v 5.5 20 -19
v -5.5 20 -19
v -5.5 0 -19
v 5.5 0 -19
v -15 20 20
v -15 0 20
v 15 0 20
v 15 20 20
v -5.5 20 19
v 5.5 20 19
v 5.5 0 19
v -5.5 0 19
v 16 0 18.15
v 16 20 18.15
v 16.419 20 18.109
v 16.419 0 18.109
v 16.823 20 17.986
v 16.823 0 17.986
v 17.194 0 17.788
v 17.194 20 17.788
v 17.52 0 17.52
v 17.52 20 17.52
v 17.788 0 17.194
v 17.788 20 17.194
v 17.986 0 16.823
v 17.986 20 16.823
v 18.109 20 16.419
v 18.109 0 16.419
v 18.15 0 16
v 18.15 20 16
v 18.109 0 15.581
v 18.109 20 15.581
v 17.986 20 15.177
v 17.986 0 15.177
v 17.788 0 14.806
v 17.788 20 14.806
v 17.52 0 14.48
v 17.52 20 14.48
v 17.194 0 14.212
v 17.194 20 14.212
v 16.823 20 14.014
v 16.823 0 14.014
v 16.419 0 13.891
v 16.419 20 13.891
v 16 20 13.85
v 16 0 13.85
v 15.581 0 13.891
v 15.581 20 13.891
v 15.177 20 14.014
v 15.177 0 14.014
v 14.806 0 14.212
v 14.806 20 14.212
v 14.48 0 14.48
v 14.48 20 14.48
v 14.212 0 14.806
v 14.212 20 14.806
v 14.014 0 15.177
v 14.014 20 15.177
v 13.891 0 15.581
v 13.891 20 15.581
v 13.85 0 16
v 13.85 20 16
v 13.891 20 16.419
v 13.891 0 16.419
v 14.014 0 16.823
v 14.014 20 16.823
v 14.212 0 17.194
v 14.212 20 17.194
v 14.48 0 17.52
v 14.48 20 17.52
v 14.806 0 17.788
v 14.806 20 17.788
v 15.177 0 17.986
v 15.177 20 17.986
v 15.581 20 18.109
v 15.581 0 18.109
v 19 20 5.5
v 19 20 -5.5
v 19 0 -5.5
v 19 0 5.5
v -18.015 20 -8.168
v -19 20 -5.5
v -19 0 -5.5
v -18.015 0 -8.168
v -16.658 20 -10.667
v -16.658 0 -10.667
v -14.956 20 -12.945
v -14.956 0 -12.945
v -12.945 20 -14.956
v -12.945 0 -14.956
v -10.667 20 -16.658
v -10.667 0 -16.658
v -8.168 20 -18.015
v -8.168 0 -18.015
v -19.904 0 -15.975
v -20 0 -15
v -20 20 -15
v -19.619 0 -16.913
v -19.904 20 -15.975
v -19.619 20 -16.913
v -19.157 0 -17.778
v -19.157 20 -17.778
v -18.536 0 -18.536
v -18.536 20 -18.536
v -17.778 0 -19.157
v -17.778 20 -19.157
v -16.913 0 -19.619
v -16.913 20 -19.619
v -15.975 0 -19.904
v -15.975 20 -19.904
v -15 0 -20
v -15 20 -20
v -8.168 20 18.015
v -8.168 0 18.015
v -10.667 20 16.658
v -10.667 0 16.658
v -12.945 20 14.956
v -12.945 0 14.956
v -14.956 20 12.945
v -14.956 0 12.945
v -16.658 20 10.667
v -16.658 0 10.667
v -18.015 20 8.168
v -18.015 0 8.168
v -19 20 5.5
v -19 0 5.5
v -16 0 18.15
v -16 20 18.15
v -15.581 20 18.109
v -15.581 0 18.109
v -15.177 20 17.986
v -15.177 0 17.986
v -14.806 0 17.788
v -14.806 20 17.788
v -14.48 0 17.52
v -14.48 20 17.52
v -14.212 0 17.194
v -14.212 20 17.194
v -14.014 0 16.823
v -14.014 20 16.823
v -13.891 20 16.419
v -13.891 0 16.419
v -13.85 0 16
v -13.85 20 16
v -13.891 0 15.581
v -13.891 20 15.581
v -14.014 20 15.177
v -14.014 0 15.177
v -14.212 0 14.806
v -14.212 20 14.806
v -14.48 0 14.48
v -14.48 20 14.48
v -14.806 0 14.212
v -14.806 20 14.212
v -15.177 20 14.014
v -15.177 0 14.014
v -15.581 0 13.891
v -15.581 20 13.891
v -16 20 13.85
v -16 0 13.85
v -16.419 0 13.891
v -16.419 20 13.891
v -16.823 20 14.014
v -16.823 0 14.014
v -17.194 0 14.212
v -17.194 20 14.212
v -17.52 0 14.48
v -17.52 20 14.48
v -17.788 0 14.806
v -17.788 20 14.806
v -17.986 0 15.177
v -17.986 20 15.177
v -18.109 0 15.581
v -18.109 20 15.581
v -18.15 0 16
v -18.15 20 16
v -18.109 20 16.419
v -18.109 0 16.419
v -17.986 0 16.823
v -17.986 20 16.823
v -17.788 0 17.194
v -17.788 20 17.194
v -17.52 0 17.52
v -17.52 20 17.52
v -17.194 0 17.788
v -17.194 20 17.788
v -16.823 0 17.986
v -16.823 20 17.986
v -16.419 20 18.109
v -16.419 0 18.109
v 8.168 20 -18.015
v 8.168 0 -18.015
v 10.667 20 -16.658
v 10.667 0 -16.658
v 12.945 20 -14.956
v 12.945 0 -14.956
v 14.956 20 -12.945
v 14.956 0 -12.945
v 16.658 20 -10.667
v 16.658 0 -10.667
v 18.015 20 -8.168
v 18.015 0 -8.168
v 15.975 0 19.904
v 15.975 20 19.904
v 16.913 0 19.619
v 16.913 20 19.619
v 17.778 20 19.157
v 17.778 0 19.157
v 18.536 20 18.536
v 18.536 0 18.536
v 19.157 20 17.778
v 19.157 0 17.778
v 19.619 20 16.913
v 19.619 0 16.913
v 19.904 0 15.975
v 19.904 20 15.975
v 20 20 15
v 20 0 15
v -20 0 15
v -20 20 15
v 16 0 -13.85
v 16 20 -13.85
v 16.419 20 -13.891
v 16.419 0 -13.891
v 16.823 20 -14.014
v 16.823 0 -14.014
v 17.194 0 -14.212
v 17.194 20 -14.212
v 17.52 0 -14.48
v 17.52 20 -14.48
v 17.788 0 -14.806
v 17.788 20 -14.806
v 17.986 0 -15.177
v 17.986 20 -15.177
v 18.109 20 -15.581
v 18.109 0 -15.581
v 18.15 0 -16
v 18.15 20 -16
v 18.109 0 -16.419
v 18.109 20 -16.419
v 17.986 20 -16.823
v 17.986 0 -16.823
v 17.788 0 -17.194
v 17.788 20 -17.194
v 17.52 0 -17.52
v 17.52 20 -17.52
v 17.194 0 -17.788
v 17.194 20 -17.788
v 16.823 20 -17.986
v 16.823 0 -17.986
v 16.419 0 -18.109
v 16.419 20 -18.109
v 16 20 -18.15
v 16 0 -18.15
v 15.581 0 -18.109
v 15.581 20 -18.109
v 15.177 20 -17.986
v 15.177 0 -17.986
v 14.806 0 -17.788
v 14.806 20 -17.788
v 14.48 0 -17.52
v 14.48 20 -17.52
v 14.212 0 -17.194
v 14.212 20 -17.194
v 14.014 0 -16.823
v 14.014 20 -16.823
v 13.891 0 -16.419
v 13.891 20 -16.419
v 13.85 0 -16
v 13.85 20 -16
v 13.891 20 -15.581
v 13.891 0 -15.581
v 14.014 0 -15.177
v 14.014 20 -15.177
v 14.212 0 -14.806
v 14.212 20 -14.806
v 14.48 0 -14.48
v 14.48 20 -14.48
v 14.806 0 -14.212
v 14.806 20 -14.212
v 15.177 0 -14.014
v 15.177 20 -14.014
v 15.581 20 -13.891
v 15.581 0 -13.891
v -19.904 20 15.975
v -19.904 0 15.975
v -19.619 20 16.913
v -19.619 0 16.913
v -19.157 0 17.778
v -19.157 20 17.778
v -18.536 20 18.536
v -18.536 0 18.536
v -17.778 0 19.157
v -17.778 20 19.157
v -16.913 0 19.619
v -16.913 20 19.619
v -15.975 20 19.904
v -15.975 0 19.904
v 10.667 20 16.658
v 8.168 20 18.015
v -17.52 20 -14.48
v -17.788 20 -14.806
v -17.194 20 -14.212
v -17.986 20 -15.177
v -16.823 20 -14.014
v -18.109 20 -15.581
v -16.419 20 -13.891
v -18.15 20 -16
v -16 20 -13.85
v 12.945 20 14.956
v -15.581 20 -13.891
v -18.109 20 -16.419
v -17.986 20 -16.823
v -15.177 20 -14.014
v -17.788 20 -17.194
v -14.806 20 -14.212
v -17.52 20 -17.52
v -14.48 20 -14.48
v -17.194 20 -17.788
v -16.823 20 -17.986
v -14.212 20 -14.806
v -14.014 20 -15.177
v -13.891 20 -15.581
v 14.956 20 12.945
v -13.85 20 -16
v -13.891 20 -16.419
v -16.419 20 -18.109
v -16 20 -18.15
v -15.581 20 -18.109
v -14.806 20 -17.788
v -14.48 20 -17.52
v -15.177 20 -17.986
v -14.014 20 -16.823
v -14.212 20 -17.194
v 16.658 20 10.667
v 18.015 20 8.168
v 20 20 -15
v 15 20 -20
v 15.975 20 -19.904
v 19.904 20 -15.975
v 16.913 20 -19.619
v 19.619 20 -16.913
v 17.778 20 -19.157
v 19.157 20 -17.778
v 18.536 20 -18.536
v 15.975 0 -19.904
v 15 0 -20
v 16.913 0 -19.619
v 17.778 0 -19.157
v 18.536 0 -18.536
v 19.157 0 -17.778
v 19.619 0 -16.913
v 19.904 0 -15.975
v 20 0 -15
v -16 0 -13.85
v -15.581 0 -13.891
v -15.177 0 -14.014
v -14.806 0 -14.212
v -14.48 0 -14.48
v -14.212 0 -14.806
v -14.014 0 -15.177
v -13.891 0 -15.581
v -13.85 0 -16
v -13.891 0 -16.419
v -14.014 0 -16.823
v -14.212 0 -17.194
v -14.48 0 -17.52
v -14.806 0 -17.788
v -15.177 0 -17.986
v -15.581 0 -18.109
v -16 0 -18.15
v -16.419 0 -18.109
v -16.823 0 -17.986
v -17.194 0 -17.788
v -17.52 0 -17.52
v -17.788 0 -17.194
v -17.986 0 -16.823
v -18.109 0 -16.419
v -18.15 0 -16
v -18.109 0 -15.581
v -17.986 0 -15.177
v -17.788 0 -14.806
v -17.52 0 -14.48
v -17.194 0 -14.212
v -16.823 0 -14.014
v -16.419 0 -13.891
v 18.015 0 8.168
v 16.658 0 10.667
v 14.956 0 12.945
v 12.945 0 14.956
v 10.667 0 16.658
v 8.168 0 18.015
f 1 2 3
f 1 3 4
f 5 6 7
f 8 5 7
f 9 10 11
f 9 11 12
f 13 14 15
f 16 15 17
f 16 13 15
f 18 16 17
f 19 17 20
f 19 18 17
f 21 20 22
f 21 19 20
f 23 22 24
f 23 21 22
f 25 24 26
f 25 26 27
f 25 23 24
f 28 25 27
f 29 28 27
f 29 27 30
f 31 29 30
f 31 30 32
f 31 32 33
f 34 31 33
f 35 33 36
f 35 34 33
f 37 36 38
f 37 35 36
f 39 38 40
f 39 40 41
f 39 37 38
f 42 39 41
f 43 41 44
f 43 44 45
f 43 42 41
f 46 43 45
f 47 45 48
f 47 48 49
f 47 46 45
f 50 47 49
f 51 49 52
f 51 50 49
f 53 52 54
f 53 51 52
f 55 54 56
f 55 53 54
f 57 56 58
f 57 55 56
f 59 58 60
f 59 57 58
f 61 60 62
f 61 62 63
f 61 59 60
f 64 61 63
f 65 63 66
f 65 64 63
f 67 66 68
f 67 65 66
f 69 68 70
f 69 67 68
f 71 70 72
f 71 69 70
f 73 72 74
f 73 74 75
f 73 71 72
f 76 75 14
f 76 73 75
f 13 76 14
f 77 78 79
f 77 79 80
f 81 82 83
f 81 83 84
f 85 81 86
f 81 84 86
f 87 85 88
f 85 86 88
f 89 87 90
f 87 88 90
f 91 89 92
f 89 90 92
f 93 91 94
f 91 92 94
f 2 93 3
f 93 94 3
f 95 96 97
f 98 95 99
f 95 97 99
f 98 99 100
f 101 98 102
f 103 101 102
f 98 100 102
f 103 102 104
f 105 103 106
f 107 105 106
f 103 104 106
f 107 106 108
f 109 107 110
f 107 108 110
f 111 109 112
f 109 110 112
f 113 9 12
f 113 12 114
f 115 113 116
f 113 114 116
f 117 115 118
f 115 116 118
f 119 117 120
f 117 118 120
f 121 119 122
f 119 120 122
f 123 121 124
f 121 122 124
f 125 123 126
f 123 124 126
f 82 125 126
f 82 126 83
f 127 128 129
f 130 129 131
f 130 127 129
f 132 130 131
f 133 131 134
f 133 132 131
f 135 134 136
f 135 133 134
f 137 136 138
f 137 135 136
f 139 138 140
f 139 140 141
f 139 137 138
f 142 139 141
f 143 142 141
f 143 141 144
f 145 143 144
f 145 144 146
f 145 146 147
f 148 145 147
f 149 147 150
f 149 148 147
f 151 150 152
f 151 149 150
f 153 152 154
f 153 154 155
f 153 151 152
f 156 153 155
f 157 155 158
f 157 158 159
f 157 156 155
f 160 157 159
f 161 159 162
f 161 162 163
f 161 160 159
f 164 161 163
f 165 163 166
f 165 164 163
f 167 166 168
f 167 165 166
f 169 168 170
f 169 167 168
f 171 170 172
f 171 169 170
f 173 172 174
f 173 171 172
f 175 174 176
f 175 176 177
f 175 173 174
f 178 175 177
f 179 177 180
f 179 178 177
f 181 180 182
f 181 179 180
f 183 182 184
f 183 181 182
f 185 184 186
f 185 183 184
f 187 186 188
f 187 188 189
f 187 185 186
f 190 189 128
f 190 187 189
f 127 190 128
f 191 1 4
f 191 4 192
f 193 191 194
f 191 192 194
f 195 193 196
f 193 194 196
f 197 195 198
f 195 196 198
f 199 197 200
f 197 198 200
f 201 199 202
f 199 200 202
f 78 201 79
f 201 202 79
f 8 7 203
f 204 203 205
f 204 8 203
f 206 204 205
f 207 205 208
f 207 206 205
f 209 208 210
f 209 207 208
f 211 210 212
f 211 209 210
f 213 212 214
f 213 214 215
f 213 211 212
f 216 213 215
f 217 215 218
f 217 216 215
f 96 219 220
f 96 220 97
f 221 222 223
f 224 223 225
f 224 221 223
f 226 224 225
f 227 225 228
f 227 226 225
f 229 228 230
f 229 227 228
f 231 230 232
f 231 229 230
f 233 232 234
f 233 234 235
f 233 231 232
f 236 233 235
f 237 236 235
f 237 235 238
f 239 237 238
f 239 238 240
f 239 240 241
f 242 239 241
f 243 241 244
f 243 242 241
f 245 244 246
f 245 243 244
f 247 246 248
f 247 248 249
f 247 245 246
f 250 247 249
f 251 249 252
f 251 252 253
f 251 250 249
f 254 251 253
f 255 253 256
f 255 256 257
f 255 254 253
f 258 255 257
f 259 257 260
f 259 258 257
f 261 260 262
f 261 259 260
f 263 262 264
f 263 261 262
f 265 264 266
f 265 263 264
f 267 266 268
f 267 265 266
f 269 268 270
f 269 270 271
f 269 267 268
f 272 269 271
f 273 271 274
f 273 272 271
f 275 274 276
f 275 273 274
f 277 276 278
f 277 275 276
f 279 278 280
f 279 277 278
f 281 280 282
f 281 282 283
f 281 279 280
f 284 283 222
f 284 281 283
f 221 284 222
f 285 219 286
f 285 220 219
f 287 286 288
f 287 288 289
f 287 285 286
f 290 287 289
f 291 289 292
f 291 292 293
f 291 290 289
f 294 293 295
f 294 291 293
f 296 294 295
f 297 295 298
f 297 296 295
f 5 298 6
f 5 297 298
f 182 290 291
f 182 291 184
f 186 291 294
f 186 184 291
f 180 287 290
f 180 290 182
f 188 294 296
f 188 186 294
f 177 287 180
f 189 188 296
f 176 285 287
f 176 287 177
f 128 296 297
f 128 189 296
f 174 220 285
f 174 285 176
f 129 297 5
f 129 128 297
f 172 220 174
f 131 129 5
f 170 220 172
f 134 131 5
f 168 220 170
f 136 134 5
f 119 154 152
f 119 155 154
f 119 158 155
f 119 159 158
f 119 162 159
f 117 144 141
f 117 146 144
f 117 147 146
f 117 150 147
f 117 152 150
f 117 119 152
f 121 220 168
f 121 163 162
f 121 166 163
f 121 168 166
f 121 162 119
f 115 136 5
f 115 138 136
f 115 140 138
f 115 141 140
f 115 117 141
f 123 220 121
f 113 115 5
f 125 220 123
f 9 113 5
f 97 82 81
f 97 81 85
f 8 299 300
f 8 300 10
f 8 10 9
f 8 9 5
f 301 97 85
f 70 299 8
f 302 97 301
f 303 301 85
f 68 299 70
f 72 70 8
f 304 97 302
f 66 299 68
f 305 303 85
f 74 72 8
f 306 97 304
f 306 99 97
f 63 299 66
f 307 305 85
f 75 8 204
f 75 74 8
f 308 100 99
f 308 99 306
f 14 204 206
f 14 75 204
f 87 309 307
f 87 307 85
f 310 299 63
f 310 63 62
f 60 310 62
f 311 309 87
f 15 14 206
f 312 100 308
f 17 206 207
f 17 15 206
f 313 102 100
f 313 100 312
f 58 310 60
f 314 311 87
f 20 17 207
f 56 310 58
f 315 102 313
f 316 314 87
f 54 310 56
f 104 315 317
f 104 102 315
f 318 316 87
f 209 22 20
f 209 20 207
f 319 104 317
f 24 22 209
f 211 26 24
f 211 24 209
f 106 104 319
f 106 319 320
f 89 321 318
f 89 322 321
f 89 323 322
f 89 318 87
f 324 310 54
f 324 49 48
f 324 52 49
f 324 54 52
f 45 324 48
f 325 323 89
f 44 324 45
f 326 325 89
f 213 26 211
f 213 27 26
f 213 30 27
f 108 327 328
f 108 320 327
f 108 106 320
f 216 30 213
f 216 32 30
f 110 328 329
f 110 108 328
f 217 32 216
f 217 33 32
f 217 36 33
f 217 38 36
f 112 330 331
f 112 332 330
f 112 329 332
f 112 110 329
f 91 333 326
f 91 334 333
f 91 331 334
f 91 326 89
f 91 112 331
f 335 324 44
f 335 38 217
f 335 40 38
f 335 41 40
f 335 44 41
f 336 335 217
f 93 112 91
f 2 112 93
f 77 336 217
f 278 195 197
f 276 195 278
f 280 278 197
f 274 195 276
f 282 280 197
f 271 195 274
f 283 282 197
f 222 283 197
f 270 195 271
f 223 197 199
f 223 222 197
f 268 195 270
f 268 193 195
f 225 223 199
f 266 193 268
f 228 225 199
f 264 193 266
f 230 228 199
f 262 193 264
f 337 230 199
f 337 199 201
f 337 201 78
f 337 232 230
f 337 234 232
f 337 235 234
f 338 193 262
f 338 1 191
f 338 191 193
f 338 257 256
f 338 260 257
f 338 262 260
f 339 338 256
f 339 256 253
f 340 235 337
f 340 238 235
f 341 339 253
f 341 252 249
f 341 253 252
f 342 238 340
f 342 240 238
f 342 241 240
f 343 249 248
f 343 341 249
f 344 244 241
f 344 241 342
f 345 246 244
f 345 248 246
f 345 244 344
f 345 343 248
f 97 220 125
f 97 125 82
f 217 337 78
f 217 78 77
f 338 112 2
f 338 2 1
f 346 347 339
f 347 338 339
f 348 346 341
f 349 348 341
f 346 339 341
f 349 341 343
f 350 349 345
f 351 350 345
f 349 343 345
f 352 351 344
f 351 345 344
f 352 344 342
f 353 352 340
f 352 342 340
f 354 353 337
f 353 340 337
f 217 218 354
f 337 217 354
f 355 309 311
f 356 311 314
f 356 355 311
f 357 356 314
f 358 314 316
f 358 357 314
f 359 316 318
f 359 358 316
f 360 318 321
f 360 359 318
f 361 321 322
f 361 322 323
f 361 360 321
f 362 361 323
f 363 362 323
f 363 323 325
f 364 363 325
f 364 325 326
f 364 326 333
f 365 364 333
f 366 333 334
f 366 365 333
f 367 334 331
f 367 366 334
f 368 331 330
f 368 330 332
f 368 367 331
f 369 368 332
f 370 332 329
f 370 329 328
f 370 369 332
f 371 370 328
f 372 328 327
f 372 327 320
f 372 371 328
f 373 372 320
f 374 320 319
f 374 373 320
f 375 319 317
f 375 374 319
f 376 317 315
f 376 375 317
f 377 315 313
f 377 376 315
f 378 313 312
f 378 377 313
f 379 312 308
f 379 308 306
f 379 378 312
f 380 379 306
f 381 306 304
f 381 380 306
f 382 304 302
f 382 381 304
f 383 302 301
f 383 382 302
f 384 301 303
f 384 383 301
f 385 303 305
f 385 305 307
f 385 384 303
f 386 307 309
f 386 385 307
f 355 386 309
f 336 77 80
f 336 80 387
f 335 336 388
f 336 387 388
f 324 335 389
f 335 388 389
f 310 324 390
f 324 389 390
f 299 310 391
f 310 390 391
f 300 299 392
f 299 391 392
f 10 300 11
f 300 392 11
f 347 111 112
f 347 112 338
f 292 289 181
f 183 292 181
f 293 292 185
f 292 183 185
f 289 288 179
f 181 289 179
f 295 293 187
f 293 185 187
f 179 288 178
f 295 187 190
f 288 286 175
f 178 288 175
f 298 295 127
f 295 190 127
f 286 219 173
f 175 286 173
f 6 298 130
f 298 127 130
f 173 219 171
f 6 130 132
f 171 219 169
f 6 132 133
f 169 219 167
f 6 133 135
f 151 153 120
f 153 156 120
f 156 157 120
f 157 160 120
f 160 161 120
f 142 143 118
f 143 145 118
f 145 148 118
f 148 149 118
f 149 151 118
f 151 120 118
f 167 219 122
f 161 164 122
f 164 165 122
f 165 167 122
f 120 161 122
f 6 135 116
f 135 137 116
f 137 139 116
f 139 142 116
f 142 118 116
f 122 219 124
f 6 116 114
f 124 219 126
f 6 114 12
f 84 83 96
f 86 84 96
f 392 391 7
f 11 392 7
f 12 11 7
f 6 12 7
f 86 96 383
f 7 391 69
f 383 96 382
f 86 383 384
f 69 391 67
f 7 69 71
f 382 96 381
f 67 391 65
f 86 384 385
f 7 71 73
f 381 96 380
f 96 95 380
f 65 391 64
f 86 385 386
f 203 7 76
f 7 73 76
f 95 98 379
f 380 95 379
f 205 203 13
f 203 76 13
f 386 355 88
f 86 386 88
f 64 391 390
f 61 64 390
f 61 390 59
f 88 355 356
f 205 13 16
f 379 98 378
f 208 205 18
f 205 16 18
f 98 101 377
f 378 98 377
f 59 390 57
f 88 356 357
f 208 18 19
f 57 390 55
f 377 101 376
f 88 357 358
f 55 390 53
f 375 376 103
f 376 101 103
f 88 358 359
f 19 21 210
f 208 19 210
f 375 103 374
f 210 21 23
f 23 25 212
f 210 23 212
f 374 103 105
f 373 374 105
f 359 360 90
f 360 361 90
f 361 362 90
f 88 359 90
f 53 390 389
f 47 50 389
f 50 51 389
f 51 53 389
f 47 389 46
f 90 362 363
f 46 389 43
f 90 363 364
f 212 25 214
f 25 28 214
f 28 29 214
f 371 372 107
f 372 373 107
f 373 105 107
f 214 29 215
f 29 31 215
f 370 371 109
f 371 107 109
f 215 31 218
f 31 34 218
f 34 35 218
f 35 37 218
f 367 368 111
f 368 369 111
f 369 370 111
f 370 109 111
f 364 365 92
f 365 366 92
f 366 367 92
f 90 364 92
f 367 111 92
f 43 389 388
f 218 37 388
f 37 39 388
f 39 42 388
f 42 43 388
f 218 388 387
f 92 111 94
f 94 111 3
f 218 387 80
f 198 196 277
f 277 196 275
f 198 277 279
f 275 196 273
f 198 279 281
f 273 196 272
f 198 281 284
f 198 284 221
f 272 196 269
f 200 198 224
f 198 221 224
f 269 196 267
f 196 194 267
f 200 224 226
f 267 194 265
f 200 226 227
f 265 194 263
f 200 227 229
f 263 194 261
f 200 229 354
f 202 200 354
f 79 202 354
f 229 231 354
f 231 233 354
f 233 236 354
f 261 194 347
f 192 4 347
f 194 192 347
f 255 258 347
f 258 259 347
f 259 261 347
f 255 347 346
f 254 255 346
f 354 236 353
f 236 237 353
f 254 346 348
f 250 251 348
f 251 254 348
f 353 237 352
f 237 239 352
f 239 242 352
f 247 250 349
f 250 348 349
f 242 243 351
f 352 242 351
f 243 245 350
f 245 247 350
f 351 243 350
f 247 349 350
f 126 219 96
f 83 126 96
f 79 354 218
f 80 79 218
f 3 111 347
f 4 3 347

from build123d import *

# Parameters (mm, degrees)
SKETCH1_W           = 40
SKETCH1_H           = 40
SKETCH1_R           = 2.15
BOSS_EXTRUDE1_DEPTH = 20
FILLET1_R           = 5


with BuildPart() as part:
    # Sketch1 → Boss-Extrude1 (new body)
    with BuildSketch(Plane(origin=(0, 0, 0), x_dir=(1, 0, 0), z_dir=(0, 1, 0))):
        Rectangle(SKETCH1_W, SKETCH1_H)
        with Locations((16, 16)):
            Circle(SKETCH1_R, mode=Mode.SUBTRACT)
        with Locations((16, -16)):
            Circle(SKETCH1_R, mode=Mode.SUBTRACT)
        with Locations((-16, -16)):
            Circle(SKETCH1_R, mode=Mode.SUBTRACT)
        with Locations((-16, 16)):
            Circle(SKETCH1_R, mode=Mode.SUBTRACT)
        with BuildLine():
            Line((-5.5, 19), (5.5, 19))
            ThreePointArc((5.5, 19), (13.986600731, 13.986600731), (19, 5.5))
            Line((19, 5.5), (19, -5.5))
            ThreePointArc((19, -5.5), (13.986600731, -13.986600731), (5.5, -19))
            Line((5.5, -19), (-5.5, -19))
            ThreePointArc((-5.5, -19), (-13.986600731, -13.986600731), (-19, -5.5))
            Line((-19, -5.5), (-19, 5.5))
            ThreePointArc((-19, 5.5), (-13.986600731, 13.986600731), (-5.5, 19))
        make_face(mode=Mode.SUBTRACT)
    extrude(amount=BOSS_EXTRUDE1_DEPTH)

    # Fillet1
    fillet1_edges = [part.edges().sort_by_distance(p)[0] for p in [
        (-20, 10, 20),
        (20, 10, 20),
        (20, 10, -20),
        (-20, 10, -20),
    ]]
    fillet(fillet1_edges, radius=FILLET1_R)


solid = part.part
